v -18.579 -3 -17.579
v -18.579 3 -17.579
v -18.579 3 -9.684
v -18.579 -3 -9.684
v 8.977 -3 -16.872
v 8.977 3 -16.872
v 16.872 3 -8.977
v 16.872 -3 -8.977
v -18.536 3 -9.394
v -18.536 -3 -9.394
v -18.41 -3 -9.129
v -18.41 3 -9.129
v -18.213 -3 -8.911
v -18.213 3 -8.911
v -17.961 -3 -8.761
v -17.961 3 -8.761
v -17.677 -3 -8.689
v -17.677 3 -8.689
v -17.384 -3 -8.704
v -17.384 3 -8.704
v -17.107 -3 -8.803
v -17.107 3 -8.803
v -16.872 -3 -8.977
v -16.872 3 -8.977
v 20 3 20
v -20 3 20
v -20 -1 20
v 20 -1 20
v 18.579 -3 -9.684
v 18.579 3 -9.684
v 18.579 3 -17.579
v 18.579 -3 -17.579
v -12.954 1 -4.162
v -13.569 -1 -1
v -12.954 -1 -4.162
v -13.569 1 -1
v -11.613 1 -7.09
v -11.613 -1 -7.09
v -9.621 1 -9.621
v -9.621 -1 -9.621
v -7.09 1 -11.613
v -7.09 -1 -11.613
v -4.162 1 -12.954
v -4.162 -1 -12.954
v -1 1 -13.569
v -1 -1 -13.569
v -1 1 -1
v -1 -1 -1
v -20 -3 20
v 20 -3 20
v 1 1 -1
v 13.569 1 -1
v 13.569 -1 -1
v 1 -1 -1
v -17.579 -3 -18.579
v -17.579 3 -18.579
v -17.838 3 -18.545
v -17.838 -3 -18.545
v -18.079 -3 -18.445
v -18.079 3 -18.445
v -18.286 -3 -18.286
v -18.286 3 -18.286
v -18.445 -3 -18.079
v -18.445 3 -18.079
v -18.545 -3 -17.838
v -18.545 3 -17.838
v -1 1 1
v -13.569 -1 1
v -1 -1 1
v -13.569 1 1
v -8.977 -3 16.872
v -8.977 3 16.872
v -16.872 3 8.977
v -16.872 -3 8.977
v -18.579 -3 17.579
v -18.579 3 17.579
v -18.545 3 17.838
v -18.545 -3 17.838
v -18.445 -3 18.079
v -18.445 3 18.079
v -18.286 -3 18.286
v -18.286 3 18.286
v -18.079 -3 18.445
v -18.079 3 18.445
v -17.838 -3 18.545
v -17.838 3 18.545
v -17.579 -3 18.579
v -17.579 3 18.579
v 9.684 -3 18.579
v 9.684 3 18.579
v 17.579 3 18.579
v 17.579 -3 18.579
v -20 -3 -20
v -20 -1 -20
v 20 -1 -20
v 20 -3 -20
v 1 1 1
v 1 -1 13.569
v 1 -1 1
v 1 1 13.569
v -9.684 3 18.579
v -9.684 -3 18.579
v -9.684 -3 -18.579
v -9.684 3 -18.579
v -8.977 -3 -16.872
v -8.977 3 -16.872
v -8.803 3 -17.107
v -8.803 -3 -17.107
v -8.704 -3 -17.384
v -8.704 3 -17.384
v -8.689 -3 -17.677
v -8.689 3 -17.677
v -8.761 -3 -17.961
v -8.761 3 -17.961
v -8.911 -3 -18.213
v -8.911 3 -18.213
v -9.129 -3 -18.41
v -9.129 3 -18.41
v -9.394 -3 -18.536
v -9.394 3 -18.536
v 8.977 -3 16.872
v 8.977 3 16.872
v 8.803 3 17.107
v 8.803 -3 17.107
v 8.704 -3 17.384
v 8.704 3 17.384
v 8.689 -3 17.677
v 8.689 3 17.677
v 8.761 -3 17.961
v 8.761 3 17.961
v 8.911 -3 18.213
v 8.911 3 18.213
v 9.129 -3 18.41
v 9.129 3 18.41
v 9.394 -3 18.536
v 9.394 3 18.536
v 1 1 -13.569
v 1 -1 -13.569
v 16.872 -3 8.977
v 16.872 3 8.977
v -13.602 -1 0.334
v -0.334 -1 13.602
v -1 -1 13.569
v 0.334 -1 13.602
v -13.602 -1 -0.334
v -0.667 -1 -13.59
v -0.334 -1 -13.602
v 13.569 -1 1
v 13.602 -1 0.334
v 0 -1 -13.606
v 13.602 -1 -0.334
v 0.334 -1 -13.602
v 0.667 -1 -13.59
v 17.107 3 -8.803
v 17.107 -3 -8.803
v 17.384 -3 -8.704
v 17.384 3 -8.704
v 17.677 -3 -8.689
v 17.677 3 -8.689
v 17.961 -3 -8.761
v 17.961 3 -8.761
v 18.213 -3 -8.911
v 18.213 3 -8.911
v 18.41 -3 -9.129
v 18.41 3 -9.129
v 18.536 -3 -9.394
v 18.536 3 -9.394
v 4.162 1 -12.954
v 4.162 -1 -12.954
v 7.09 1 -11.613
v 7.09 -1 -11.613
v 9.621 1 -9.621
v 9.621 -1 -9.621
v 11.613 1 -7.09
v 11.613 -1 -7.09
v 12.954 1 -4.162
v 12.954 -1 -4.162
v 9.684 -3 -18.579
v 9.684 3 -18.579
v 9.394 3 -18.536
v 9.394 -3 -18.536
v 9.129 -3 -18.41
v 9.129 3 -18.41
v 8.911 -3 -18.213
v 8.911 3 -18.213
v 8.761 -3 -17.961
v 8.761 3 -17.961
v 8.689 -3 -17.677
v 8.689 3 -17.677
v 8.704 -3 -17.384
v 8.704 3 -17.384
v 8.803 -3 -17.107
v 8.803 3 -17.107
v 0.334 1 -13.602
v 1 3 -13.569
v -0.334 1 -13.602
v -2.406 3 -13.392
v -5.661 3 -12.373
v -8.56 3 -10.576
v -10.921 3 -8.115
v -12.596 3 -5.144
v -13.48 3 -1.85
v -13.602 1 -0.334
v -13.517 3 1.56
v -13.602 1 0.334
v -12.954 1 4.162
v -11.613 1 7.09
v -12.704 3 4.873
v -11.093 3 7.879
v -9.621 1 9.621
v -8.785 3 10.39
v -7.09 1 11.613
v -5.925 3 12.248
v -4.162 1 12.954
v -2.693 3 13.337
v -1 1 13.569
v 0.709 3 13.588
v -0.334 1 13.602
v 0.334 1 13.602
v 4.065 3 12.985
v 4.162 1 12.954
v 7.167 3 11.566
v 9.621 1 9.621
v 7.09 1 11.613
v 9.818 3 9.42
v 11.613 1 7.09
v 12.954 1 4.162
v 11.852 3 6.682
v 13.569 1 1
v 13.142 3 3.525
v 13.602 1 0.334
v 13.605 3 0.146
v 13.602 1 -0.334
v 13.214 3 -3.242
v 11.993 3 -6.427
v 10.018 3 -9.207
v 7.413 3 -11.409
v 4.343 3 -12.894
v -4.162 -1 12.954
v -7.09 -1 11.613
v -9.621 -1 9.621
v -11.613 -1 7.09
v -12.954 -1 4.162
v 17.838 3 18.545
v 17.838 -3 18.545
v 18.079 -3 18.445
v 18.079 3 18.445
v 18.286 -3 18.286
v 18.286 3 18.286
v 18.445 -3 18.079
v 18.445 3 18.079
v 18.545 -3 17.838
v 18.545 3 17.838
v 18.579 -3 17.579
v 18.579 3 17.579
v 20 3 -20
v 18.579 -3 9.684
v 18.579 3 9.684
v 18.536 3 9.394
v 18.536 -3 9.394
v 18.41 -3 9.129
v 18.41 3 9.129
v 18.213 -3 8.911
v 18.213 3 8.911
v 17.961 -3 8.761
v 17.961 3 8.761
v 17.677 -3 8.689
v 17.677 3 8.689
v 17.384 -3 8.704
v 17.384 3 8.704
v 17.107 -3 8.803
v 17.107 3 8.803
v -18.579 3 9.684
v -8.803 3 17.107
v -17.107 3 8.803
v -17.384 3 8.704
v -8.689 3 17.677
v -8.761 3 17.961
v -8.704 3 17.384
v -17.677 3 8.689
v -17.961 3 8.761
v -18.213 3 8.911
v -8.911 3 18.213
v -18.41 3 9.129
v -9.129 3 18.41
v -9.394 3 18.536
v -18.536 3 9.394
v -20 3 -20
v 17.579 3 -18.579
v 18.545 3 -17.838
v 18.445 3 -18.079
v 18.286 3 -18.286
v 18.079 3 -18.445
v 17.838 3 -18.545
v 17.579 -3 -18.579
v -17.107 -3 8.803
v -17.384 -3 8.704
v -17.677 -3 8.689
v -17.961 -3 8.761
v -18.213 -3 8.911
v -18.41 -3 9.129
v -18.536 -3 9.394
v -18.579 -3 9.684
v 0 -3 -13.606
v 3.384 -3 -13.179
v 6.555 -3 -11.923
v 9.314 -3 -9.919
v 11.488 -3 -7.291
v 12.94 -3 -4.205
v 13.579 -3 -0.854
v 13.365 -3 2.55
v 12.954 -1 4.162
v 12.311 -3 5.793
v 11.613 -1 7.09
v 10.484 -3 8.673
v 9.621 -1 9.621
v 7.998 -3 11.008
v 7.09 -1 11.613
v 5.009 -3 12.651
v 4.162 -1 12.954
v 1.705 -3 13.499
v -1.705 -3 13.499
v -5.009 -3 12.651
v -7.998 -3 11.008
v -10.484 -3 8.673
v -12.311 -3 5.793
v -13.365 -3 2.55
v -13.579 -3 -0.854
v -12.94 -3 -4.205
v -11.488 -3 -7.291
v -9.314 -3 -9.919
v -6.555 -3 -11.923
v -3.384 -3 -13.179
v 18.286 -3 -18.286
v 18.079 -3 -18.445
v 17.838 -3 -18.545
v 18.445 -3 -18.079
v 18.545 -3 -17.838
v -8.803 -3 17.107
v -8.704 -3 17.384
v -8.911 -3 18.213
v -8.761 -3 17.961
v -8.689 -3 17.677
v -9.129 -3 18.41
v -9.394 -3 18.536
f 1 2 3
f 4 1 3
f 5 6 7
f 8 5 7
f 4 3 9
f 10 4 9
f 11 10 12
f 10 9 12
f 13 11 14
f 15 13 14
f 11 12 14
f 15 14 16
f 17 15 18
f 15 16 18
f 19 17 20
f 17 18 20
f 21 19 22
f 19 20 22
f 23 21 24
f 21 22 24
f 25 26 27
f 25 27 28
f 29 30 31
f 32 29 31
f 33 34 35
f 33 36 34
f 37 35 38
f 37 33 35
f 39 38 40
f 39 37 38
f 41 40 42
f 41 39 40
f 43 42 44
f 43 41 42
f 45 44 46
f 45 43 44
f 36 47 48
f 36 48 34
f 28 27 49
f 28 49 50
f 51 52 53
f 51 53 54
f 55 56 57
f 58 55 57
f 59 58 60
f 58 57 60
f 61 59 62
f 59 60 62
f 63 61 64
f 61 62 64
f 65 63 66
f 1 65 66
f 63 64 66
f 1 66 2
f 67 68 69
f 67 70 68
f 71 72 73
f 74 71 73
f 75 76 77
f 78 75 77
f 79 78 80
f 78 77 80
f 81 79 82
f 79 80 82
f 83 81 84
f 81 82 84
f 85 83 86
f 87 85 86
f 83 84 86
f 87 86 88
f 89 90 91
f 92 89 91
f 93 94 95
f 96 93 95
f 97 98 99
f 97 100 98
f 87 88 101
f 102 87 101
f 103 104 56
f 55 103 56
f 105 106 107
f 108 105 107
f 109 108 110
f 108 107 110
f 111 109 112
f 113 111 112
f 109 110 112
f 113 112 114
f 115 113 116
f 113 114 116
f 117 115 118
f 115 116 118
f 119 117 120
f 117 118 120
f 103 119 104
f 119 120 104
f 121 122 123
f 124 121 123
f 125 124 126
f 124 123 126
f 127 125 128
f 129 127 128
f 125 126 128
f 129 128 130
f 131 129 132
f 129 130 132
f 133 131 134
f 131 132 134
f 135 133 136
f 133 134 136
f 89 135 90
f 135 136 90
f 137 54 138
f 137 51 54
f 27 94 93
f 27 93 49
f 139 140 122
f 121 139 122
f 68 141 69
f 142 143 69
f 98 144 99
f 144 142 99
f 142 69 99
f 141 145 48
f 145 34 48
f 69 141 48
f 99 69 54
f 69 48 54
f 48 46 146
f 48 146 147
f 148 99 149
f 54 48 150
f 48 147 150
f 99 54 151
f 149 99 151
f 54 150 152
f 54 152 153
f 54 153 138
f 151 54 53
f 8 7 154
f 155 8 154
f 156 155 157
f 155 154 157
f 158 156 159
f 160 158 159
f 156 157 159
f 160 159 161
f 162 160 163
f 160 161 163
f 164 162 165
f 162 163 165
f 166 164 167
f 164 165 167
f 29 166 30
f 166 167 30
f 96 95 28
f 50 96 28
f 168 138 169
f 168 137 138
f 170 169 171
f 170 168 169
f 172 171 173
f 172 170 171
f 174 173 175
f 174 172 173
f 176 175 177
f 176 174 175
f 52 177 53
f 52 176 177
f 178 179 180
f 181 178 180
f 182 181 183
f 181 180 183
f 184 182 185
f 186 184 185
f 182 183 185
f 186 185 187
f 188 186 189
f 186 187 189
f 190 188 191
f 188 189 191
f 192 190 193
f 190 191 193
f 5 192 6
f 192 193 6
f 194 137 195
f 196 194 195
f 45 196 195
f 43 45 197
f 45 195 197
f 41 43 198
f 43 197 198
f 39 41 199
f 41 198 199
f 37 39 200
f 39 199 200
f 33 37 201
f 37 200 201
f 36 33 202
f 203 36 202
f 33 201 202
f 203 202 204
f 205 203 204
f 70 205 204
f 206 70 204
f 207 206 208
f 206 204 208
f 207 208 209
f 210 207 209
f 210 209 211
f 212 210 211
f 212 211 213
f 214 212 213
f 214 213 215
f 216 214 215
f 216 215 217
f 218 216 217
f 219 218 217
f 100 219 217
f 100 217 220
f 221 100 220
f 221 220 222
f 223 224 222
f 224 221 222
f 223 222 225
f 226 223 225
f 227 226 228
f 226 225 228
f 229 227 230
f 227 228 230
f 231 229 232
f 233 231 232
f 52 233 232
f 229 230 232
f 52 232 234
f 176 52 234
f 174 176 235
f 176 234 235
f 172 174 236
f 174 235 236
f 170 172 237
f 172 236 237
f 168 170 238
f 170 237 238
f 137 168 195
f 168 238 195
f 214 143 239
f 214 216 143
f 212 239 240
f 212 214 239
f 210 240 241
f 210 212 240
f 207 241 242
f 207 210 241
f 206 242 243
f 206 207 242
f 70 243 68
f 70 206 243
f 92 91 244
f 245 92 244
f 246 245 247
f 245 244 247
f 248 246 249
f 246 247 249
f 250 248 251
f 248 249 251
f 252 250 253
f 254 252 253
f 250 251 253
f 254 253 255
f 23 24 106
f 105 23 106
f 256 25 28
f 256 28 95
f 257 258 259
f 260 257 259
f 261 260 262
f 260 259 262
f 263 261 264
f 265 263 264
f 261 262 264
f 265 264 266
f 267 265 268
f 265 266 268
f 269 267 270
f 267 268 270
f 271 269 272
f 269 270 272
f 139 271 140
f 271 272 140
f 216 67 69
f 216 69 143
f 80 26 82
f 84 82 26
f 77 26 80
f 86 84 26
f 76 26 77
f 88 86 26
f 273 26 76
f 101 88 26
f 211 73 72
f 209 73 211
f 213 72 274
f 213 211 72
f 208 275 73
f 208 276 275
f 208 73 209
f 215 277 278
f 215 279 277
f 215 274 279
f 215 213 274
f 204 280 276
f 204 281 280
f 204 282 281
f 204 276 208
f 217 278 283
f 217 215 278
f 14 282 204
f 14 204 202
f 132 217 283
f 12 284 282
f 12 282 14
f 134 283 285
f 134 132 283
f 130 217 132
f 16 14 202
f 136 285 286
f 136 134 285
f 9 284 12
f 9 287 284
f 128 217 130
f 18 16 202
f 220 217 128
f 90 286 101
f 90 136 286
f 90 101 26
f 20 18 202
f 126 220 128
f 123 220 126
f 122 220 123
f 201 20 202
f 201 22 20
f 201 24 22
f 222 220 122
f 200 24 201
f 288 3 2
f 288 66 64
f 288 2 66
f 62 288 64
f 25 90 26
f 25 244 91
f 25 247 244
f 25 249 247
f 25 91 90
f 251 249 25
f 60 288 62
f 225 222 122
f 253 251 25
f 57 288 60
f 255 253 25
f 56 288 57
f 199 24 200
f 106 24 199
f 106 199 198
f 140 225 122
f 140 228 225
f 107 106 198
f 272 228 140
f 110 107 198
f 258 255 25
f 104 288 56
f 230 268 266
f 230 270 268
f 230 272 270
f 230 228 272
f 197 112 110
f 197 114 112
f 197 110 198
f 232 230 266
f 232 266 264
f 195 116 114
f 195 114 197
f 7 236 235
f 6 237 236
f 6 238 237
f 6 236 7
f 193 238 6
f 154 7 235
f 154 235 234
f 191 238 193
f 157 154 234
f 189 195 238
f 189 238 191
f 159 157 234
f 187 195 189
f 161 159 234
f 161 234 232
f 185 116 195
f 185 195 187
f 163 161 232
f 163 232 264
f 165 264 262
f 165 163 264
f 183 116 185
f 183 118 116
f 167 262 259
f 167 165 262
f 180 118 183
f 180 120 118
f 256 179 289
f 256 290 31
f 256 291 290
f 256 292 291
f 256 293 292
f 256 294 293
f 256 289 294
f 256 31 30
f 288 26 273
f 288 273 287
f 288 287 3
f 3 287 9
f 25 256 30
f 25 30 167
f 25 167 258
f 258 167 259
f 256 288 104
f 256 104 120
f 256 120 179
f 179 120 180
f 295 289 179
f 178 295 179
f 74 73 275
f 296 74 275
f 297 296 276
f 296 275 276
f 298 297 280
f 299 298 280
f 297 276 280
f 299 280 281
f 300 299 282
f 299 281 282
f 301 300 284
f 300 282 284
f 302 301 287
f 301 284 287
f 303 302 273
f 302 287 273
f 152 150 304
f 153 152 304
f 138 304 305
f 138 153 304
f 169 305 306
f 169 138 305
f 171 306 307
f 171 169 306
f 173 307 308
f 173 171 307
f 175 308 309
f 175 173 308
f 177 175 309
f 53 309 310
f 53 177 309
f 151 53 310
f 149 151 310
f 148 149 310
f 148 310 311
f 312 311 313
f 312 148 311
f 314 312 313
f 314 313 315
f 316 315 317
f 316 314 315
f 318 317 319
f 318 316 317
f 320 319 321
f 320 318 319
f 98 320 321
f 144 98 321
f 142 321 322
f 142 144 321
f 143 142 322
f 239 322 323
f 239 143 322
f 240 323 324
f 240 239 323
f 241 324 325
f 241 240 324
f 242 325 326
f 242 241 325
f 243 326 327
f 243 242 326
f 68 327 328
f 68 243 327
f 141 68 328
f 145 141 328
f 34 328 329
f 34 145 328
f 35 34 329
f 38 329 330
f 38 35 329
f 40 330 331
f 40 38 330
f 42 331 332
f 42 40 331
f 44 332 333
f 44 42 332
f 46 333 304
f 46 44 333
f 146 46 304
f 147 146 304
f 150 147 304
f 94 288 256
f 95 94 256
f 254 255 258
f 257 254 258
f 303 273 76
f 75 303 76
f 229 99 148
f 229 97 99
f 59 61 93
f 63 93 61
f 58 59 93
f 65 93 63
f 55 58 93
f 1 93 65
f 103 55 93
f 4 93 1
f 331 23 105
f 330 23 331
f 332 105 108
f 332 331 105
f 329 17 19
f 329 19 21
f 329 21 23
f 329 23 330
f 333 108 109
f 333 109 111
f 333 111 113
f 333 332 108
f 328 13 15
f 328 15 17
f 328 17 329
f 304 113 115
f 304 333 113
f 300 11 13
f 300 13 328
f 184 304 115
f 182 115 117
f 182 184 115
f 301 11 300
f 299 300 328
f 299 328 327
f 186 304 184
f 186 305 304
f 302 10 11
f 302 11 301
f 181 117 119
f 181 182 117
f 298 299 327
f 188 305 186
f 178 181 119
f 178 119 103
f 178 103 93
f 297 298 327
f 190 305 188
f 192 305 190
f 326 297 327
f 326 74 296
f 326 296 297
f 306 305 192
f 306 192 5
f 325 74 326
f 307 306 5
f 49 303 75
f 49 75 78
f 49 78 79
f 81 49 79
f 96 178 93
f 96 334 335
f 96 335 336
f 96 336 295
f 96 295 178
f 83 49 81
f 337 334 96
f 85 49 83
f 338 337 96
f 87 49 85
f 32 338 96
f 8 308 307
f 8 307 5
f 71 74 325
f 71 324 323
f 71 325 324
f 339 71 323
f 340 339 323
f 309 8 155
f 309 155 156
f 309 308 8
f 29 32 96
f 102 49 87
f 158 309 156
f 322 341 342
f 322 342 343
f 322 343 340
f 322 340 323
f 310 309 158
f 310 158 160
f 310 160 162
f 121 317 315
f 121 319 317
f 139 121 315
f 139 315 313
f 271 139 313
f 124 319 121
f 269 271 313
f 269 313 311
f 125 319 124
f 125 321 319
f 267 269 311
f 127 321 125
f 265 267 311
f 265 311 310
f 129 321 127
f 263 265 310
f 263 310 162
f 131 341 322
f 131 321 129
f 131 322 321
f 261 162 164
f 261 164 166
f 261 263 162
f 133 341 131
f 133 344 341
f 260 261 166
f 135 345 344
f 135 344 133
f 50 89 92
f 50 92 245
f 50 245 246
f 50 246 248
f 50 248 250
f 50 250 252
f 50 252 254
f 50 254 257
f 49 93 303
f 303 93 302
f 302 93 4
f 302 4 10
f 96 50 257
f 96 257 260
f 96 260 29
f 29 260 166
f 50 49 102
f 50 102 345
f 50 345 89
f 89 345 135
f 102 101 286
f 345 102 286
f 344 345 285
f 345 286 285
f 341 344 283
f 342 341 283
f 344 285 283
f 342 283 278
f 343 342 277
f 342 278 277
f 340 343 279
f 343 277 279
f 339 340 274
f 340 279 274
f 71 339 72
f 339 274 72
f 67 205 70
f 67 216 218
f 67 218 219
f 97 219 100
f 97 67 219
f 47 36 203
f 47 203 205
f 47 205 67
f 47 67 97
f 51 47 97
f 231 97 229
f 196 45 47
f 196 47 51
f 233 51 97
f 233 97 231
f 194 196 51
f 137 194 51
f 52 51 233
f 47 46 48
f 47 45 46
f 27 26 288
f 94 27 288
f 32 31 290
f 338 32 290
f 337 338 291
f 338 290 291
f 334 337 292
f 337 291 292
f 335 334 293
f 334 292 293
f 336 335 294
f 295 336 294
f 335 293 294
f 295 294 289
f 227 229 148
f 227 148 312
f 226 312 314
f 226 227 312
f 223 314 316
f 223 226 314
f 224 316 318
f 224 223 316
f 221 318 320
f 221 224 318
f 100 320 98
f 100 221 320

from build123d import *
from build123d.topology import SkipClean

# Parameters (mm, degrees)
SKETCH1_W           = 40
SKETCH1_H           = 40
BOSS_EXTRUDE1_DEPTH = 1
BOSS_EXTRUDE2_START = 2
SKETCH2_W           = 40
SKETCH2_H           = 40
SKETCH2_R           = 13.606270174
BOSS_EXTRUDE2_DEPTH = 2
SKETCH3_W           = 40
SKETCH3_H           = 40
SKETCH3_R           = 13.606270174
BOSS_EXTRUDE3_DEPTH = 2
CUT_EXTRUDE1_DEPTH  = 6


with BuildPart() as part:
    # Sketch1 → Boss-Extrude1 (new, symmetric)
    with BuildSketch(Plane(origin=(0, 0, 0), x_dir=(1, 0, 0), z_dir=(0, 1, 0))):
        Rectangle(SKETCH1_W, SKETCH1_H)
        with BuildLine():
            Line((-1, -1), (-1, -13.569472652))
            ThreePointArc((-1, -13.569472652), (-9.621085907, -9.621085907), (-13.569472652, -1))
            Line((-13.569472652, -1), (-1, -1))
        make_face(mode=Mode.SUBTRACT)
        with BuildLine():
            ThreePointArc((13.569472652, -1), (9.621085907, -9.621085907), (1, -13.569472652))
            Line((1, -13.569472652), (1, -1))
            Line((1, -1), (13.569472652, -1))
        make_face(mode=Mode.SUBTRACT)
        with BuildLine():
            Line((-1, 1), (-13.569472652, 1))
            ThreePointArc((-13.569472652, 1), (-9.621085907, 9.621085907), (-1, 13.569472652))
            Line((-1, 13.569472652), (-1, 1))
        make_face(mode=Mode.SUBTRACT)
        with BuildLine():
            Line((13.569472652, 1), (1, 1))
            Line((1, 1), (1, 13.569472652))
            ThreePointArc((1, 13.569472652), (9.621085907, 9.621085907), (13.569472652, 1))
        make_face(mode=Mode.SUBTRACT)
    extrude(amount=BOSS_EXTRUDE1_DEPTH, both=True)

    # Sketch2 → Boss-Extrude2 (add)
    with BuildSketch(Plane(origin=(0, 1, 0), x_dir=(1, 0, 0), z_dir=(0, 1, 0)).offset(BOSS_EXTRUDE2_START)):
        Rectangle(SKETCH2_W, SKETCH2_H)
        with Locations(Location((0, 0, 0), (0, 0, 85.785216229))):
            Circle(SKETCH2_R, mode=Mode.SUBTRACT)
    extrude(amount=-BOSS_EXTRUDE2_DEPTH)

    # Sketch3 → Boss-Extrude3 (add)
    with SkipClean():  # the faces are left unmerged after this step: merging them gives an invalid solid
        with BuildSketch(Plane.XZ.offset(1)):
            Rectangle(SKETCH3_W, SKETCH3_H)
            with Locations(Location((0, 0, 0), (0, 0, 270))):
                Circle(SKETCH3_R, mode=Mode.SUBTRACT)
        extrude(amount=BOSS_EXTRUDE3_DEPTH)

    # Sketch4 → Cut-Extrude1 (cut)
    with SkipClean():  # the faces are left unmerged after this step: merging them gives an invalid solid
        with BuildSketch(Plane(origin=(0, 3, 0), x_dir=(1, 0, 0), z_dir=(0, 1, 0))):
            with BuildLine():
                Line((-18.578772203, 17.578772203), (-18.578772203, 9.684451785))
                ThreePointArc((-18.578772203, 9.684451785), (-17.961455635, 8.760572252), (-16.871665421, 8.977345004))
                Line((-16.871665421, 8.977345004), (-8.977345004, 16.871665421))
                ThreePointArc((-8.977345004, 16.871665421), (-8.760572252, 17.961455635), (-9.684451785, 18.578772203))
                Line((-9.684451785, 18.578772203), (-17.578772203, 18.578772203))
                ThreePointArc((-17.578772203, 18.578772203), (-18.285878984, 18.285878984), (-18.578772203, 17.578772203))
            make_face()
            with BuildLine():
                Line((8.977345004, 16.871665421), (16.871665421, 8.977345004))
                ThreePointArc((16.871665421, 8.977345004), (17.961455635, 8.760572252), (18.578772203, 9.684451785))
                Line((18.578772203, 9.684451785), (18.578772203, 17.578772203))
                ThreePointArc((18.578772203, 17.578772203), (18.285878984, 18.285878984), (17.578772203, 18.578772203))
                Line((17.578772203, 18.578772203), (9.684451785, 18.578772203))
                ThreePointArc((9.684451785, 18.578772203), (8.760572252, 17.961455635), (8.977345004, 16.871665421))
            make_face()
            with BuildLine():
                Line((16.871665421, -8.977345004), (8.977345004, -16.871665421))
                ThreePointArc((8.977345004, -16.871665421), (8.760572252, -17.961455635), (9.684451785, -18.578772203))
                Line((9.684451785, -18.578772203), (17.578772203, -18.578772203))
                ThreePointArc((17.578772203, -18.578772203), (18.285878984, -18.285878984), (18.578772203, -17.578772203))
                Line((18.578772203, -17.578772203), (18.578772203, -9.684451785))
                ThreePointArc((18.578772203, -9.684451785), (17.961455635, -8.760572252), (16.871665421, -8.977345004))
            make_face()
            with BuildLine():
                Line((-8.977345004, -16.871665421), (-16.871665421, -8.977345004))
                ThreePointArc((-16.871665421, -8.977345004), (-17.961455635, -8.760572252), (-18.578772203, -9.684451785))
                Line((-18.578772203, -9.684451785), (-18.578772203, -17.578772203))
                ThreePointArc((-18.578772203, -17.578772203), (-18.285878984, -18.285878984), (-17.578772203, -18.578772203))
                Line((-17.578772203, -18.578772203), (-9.684451785, -18.578772203))
                ThreePointArc((-9.684451785, -18.578772203), (-8.760572252, -17.961455635), (-8.977345004, -16.871665421))
            make_face()
        extrude(amount=-CUT_EXTRUDE1_DEPTH, mode=Mode.SUBTRACT)


solid = part.part
